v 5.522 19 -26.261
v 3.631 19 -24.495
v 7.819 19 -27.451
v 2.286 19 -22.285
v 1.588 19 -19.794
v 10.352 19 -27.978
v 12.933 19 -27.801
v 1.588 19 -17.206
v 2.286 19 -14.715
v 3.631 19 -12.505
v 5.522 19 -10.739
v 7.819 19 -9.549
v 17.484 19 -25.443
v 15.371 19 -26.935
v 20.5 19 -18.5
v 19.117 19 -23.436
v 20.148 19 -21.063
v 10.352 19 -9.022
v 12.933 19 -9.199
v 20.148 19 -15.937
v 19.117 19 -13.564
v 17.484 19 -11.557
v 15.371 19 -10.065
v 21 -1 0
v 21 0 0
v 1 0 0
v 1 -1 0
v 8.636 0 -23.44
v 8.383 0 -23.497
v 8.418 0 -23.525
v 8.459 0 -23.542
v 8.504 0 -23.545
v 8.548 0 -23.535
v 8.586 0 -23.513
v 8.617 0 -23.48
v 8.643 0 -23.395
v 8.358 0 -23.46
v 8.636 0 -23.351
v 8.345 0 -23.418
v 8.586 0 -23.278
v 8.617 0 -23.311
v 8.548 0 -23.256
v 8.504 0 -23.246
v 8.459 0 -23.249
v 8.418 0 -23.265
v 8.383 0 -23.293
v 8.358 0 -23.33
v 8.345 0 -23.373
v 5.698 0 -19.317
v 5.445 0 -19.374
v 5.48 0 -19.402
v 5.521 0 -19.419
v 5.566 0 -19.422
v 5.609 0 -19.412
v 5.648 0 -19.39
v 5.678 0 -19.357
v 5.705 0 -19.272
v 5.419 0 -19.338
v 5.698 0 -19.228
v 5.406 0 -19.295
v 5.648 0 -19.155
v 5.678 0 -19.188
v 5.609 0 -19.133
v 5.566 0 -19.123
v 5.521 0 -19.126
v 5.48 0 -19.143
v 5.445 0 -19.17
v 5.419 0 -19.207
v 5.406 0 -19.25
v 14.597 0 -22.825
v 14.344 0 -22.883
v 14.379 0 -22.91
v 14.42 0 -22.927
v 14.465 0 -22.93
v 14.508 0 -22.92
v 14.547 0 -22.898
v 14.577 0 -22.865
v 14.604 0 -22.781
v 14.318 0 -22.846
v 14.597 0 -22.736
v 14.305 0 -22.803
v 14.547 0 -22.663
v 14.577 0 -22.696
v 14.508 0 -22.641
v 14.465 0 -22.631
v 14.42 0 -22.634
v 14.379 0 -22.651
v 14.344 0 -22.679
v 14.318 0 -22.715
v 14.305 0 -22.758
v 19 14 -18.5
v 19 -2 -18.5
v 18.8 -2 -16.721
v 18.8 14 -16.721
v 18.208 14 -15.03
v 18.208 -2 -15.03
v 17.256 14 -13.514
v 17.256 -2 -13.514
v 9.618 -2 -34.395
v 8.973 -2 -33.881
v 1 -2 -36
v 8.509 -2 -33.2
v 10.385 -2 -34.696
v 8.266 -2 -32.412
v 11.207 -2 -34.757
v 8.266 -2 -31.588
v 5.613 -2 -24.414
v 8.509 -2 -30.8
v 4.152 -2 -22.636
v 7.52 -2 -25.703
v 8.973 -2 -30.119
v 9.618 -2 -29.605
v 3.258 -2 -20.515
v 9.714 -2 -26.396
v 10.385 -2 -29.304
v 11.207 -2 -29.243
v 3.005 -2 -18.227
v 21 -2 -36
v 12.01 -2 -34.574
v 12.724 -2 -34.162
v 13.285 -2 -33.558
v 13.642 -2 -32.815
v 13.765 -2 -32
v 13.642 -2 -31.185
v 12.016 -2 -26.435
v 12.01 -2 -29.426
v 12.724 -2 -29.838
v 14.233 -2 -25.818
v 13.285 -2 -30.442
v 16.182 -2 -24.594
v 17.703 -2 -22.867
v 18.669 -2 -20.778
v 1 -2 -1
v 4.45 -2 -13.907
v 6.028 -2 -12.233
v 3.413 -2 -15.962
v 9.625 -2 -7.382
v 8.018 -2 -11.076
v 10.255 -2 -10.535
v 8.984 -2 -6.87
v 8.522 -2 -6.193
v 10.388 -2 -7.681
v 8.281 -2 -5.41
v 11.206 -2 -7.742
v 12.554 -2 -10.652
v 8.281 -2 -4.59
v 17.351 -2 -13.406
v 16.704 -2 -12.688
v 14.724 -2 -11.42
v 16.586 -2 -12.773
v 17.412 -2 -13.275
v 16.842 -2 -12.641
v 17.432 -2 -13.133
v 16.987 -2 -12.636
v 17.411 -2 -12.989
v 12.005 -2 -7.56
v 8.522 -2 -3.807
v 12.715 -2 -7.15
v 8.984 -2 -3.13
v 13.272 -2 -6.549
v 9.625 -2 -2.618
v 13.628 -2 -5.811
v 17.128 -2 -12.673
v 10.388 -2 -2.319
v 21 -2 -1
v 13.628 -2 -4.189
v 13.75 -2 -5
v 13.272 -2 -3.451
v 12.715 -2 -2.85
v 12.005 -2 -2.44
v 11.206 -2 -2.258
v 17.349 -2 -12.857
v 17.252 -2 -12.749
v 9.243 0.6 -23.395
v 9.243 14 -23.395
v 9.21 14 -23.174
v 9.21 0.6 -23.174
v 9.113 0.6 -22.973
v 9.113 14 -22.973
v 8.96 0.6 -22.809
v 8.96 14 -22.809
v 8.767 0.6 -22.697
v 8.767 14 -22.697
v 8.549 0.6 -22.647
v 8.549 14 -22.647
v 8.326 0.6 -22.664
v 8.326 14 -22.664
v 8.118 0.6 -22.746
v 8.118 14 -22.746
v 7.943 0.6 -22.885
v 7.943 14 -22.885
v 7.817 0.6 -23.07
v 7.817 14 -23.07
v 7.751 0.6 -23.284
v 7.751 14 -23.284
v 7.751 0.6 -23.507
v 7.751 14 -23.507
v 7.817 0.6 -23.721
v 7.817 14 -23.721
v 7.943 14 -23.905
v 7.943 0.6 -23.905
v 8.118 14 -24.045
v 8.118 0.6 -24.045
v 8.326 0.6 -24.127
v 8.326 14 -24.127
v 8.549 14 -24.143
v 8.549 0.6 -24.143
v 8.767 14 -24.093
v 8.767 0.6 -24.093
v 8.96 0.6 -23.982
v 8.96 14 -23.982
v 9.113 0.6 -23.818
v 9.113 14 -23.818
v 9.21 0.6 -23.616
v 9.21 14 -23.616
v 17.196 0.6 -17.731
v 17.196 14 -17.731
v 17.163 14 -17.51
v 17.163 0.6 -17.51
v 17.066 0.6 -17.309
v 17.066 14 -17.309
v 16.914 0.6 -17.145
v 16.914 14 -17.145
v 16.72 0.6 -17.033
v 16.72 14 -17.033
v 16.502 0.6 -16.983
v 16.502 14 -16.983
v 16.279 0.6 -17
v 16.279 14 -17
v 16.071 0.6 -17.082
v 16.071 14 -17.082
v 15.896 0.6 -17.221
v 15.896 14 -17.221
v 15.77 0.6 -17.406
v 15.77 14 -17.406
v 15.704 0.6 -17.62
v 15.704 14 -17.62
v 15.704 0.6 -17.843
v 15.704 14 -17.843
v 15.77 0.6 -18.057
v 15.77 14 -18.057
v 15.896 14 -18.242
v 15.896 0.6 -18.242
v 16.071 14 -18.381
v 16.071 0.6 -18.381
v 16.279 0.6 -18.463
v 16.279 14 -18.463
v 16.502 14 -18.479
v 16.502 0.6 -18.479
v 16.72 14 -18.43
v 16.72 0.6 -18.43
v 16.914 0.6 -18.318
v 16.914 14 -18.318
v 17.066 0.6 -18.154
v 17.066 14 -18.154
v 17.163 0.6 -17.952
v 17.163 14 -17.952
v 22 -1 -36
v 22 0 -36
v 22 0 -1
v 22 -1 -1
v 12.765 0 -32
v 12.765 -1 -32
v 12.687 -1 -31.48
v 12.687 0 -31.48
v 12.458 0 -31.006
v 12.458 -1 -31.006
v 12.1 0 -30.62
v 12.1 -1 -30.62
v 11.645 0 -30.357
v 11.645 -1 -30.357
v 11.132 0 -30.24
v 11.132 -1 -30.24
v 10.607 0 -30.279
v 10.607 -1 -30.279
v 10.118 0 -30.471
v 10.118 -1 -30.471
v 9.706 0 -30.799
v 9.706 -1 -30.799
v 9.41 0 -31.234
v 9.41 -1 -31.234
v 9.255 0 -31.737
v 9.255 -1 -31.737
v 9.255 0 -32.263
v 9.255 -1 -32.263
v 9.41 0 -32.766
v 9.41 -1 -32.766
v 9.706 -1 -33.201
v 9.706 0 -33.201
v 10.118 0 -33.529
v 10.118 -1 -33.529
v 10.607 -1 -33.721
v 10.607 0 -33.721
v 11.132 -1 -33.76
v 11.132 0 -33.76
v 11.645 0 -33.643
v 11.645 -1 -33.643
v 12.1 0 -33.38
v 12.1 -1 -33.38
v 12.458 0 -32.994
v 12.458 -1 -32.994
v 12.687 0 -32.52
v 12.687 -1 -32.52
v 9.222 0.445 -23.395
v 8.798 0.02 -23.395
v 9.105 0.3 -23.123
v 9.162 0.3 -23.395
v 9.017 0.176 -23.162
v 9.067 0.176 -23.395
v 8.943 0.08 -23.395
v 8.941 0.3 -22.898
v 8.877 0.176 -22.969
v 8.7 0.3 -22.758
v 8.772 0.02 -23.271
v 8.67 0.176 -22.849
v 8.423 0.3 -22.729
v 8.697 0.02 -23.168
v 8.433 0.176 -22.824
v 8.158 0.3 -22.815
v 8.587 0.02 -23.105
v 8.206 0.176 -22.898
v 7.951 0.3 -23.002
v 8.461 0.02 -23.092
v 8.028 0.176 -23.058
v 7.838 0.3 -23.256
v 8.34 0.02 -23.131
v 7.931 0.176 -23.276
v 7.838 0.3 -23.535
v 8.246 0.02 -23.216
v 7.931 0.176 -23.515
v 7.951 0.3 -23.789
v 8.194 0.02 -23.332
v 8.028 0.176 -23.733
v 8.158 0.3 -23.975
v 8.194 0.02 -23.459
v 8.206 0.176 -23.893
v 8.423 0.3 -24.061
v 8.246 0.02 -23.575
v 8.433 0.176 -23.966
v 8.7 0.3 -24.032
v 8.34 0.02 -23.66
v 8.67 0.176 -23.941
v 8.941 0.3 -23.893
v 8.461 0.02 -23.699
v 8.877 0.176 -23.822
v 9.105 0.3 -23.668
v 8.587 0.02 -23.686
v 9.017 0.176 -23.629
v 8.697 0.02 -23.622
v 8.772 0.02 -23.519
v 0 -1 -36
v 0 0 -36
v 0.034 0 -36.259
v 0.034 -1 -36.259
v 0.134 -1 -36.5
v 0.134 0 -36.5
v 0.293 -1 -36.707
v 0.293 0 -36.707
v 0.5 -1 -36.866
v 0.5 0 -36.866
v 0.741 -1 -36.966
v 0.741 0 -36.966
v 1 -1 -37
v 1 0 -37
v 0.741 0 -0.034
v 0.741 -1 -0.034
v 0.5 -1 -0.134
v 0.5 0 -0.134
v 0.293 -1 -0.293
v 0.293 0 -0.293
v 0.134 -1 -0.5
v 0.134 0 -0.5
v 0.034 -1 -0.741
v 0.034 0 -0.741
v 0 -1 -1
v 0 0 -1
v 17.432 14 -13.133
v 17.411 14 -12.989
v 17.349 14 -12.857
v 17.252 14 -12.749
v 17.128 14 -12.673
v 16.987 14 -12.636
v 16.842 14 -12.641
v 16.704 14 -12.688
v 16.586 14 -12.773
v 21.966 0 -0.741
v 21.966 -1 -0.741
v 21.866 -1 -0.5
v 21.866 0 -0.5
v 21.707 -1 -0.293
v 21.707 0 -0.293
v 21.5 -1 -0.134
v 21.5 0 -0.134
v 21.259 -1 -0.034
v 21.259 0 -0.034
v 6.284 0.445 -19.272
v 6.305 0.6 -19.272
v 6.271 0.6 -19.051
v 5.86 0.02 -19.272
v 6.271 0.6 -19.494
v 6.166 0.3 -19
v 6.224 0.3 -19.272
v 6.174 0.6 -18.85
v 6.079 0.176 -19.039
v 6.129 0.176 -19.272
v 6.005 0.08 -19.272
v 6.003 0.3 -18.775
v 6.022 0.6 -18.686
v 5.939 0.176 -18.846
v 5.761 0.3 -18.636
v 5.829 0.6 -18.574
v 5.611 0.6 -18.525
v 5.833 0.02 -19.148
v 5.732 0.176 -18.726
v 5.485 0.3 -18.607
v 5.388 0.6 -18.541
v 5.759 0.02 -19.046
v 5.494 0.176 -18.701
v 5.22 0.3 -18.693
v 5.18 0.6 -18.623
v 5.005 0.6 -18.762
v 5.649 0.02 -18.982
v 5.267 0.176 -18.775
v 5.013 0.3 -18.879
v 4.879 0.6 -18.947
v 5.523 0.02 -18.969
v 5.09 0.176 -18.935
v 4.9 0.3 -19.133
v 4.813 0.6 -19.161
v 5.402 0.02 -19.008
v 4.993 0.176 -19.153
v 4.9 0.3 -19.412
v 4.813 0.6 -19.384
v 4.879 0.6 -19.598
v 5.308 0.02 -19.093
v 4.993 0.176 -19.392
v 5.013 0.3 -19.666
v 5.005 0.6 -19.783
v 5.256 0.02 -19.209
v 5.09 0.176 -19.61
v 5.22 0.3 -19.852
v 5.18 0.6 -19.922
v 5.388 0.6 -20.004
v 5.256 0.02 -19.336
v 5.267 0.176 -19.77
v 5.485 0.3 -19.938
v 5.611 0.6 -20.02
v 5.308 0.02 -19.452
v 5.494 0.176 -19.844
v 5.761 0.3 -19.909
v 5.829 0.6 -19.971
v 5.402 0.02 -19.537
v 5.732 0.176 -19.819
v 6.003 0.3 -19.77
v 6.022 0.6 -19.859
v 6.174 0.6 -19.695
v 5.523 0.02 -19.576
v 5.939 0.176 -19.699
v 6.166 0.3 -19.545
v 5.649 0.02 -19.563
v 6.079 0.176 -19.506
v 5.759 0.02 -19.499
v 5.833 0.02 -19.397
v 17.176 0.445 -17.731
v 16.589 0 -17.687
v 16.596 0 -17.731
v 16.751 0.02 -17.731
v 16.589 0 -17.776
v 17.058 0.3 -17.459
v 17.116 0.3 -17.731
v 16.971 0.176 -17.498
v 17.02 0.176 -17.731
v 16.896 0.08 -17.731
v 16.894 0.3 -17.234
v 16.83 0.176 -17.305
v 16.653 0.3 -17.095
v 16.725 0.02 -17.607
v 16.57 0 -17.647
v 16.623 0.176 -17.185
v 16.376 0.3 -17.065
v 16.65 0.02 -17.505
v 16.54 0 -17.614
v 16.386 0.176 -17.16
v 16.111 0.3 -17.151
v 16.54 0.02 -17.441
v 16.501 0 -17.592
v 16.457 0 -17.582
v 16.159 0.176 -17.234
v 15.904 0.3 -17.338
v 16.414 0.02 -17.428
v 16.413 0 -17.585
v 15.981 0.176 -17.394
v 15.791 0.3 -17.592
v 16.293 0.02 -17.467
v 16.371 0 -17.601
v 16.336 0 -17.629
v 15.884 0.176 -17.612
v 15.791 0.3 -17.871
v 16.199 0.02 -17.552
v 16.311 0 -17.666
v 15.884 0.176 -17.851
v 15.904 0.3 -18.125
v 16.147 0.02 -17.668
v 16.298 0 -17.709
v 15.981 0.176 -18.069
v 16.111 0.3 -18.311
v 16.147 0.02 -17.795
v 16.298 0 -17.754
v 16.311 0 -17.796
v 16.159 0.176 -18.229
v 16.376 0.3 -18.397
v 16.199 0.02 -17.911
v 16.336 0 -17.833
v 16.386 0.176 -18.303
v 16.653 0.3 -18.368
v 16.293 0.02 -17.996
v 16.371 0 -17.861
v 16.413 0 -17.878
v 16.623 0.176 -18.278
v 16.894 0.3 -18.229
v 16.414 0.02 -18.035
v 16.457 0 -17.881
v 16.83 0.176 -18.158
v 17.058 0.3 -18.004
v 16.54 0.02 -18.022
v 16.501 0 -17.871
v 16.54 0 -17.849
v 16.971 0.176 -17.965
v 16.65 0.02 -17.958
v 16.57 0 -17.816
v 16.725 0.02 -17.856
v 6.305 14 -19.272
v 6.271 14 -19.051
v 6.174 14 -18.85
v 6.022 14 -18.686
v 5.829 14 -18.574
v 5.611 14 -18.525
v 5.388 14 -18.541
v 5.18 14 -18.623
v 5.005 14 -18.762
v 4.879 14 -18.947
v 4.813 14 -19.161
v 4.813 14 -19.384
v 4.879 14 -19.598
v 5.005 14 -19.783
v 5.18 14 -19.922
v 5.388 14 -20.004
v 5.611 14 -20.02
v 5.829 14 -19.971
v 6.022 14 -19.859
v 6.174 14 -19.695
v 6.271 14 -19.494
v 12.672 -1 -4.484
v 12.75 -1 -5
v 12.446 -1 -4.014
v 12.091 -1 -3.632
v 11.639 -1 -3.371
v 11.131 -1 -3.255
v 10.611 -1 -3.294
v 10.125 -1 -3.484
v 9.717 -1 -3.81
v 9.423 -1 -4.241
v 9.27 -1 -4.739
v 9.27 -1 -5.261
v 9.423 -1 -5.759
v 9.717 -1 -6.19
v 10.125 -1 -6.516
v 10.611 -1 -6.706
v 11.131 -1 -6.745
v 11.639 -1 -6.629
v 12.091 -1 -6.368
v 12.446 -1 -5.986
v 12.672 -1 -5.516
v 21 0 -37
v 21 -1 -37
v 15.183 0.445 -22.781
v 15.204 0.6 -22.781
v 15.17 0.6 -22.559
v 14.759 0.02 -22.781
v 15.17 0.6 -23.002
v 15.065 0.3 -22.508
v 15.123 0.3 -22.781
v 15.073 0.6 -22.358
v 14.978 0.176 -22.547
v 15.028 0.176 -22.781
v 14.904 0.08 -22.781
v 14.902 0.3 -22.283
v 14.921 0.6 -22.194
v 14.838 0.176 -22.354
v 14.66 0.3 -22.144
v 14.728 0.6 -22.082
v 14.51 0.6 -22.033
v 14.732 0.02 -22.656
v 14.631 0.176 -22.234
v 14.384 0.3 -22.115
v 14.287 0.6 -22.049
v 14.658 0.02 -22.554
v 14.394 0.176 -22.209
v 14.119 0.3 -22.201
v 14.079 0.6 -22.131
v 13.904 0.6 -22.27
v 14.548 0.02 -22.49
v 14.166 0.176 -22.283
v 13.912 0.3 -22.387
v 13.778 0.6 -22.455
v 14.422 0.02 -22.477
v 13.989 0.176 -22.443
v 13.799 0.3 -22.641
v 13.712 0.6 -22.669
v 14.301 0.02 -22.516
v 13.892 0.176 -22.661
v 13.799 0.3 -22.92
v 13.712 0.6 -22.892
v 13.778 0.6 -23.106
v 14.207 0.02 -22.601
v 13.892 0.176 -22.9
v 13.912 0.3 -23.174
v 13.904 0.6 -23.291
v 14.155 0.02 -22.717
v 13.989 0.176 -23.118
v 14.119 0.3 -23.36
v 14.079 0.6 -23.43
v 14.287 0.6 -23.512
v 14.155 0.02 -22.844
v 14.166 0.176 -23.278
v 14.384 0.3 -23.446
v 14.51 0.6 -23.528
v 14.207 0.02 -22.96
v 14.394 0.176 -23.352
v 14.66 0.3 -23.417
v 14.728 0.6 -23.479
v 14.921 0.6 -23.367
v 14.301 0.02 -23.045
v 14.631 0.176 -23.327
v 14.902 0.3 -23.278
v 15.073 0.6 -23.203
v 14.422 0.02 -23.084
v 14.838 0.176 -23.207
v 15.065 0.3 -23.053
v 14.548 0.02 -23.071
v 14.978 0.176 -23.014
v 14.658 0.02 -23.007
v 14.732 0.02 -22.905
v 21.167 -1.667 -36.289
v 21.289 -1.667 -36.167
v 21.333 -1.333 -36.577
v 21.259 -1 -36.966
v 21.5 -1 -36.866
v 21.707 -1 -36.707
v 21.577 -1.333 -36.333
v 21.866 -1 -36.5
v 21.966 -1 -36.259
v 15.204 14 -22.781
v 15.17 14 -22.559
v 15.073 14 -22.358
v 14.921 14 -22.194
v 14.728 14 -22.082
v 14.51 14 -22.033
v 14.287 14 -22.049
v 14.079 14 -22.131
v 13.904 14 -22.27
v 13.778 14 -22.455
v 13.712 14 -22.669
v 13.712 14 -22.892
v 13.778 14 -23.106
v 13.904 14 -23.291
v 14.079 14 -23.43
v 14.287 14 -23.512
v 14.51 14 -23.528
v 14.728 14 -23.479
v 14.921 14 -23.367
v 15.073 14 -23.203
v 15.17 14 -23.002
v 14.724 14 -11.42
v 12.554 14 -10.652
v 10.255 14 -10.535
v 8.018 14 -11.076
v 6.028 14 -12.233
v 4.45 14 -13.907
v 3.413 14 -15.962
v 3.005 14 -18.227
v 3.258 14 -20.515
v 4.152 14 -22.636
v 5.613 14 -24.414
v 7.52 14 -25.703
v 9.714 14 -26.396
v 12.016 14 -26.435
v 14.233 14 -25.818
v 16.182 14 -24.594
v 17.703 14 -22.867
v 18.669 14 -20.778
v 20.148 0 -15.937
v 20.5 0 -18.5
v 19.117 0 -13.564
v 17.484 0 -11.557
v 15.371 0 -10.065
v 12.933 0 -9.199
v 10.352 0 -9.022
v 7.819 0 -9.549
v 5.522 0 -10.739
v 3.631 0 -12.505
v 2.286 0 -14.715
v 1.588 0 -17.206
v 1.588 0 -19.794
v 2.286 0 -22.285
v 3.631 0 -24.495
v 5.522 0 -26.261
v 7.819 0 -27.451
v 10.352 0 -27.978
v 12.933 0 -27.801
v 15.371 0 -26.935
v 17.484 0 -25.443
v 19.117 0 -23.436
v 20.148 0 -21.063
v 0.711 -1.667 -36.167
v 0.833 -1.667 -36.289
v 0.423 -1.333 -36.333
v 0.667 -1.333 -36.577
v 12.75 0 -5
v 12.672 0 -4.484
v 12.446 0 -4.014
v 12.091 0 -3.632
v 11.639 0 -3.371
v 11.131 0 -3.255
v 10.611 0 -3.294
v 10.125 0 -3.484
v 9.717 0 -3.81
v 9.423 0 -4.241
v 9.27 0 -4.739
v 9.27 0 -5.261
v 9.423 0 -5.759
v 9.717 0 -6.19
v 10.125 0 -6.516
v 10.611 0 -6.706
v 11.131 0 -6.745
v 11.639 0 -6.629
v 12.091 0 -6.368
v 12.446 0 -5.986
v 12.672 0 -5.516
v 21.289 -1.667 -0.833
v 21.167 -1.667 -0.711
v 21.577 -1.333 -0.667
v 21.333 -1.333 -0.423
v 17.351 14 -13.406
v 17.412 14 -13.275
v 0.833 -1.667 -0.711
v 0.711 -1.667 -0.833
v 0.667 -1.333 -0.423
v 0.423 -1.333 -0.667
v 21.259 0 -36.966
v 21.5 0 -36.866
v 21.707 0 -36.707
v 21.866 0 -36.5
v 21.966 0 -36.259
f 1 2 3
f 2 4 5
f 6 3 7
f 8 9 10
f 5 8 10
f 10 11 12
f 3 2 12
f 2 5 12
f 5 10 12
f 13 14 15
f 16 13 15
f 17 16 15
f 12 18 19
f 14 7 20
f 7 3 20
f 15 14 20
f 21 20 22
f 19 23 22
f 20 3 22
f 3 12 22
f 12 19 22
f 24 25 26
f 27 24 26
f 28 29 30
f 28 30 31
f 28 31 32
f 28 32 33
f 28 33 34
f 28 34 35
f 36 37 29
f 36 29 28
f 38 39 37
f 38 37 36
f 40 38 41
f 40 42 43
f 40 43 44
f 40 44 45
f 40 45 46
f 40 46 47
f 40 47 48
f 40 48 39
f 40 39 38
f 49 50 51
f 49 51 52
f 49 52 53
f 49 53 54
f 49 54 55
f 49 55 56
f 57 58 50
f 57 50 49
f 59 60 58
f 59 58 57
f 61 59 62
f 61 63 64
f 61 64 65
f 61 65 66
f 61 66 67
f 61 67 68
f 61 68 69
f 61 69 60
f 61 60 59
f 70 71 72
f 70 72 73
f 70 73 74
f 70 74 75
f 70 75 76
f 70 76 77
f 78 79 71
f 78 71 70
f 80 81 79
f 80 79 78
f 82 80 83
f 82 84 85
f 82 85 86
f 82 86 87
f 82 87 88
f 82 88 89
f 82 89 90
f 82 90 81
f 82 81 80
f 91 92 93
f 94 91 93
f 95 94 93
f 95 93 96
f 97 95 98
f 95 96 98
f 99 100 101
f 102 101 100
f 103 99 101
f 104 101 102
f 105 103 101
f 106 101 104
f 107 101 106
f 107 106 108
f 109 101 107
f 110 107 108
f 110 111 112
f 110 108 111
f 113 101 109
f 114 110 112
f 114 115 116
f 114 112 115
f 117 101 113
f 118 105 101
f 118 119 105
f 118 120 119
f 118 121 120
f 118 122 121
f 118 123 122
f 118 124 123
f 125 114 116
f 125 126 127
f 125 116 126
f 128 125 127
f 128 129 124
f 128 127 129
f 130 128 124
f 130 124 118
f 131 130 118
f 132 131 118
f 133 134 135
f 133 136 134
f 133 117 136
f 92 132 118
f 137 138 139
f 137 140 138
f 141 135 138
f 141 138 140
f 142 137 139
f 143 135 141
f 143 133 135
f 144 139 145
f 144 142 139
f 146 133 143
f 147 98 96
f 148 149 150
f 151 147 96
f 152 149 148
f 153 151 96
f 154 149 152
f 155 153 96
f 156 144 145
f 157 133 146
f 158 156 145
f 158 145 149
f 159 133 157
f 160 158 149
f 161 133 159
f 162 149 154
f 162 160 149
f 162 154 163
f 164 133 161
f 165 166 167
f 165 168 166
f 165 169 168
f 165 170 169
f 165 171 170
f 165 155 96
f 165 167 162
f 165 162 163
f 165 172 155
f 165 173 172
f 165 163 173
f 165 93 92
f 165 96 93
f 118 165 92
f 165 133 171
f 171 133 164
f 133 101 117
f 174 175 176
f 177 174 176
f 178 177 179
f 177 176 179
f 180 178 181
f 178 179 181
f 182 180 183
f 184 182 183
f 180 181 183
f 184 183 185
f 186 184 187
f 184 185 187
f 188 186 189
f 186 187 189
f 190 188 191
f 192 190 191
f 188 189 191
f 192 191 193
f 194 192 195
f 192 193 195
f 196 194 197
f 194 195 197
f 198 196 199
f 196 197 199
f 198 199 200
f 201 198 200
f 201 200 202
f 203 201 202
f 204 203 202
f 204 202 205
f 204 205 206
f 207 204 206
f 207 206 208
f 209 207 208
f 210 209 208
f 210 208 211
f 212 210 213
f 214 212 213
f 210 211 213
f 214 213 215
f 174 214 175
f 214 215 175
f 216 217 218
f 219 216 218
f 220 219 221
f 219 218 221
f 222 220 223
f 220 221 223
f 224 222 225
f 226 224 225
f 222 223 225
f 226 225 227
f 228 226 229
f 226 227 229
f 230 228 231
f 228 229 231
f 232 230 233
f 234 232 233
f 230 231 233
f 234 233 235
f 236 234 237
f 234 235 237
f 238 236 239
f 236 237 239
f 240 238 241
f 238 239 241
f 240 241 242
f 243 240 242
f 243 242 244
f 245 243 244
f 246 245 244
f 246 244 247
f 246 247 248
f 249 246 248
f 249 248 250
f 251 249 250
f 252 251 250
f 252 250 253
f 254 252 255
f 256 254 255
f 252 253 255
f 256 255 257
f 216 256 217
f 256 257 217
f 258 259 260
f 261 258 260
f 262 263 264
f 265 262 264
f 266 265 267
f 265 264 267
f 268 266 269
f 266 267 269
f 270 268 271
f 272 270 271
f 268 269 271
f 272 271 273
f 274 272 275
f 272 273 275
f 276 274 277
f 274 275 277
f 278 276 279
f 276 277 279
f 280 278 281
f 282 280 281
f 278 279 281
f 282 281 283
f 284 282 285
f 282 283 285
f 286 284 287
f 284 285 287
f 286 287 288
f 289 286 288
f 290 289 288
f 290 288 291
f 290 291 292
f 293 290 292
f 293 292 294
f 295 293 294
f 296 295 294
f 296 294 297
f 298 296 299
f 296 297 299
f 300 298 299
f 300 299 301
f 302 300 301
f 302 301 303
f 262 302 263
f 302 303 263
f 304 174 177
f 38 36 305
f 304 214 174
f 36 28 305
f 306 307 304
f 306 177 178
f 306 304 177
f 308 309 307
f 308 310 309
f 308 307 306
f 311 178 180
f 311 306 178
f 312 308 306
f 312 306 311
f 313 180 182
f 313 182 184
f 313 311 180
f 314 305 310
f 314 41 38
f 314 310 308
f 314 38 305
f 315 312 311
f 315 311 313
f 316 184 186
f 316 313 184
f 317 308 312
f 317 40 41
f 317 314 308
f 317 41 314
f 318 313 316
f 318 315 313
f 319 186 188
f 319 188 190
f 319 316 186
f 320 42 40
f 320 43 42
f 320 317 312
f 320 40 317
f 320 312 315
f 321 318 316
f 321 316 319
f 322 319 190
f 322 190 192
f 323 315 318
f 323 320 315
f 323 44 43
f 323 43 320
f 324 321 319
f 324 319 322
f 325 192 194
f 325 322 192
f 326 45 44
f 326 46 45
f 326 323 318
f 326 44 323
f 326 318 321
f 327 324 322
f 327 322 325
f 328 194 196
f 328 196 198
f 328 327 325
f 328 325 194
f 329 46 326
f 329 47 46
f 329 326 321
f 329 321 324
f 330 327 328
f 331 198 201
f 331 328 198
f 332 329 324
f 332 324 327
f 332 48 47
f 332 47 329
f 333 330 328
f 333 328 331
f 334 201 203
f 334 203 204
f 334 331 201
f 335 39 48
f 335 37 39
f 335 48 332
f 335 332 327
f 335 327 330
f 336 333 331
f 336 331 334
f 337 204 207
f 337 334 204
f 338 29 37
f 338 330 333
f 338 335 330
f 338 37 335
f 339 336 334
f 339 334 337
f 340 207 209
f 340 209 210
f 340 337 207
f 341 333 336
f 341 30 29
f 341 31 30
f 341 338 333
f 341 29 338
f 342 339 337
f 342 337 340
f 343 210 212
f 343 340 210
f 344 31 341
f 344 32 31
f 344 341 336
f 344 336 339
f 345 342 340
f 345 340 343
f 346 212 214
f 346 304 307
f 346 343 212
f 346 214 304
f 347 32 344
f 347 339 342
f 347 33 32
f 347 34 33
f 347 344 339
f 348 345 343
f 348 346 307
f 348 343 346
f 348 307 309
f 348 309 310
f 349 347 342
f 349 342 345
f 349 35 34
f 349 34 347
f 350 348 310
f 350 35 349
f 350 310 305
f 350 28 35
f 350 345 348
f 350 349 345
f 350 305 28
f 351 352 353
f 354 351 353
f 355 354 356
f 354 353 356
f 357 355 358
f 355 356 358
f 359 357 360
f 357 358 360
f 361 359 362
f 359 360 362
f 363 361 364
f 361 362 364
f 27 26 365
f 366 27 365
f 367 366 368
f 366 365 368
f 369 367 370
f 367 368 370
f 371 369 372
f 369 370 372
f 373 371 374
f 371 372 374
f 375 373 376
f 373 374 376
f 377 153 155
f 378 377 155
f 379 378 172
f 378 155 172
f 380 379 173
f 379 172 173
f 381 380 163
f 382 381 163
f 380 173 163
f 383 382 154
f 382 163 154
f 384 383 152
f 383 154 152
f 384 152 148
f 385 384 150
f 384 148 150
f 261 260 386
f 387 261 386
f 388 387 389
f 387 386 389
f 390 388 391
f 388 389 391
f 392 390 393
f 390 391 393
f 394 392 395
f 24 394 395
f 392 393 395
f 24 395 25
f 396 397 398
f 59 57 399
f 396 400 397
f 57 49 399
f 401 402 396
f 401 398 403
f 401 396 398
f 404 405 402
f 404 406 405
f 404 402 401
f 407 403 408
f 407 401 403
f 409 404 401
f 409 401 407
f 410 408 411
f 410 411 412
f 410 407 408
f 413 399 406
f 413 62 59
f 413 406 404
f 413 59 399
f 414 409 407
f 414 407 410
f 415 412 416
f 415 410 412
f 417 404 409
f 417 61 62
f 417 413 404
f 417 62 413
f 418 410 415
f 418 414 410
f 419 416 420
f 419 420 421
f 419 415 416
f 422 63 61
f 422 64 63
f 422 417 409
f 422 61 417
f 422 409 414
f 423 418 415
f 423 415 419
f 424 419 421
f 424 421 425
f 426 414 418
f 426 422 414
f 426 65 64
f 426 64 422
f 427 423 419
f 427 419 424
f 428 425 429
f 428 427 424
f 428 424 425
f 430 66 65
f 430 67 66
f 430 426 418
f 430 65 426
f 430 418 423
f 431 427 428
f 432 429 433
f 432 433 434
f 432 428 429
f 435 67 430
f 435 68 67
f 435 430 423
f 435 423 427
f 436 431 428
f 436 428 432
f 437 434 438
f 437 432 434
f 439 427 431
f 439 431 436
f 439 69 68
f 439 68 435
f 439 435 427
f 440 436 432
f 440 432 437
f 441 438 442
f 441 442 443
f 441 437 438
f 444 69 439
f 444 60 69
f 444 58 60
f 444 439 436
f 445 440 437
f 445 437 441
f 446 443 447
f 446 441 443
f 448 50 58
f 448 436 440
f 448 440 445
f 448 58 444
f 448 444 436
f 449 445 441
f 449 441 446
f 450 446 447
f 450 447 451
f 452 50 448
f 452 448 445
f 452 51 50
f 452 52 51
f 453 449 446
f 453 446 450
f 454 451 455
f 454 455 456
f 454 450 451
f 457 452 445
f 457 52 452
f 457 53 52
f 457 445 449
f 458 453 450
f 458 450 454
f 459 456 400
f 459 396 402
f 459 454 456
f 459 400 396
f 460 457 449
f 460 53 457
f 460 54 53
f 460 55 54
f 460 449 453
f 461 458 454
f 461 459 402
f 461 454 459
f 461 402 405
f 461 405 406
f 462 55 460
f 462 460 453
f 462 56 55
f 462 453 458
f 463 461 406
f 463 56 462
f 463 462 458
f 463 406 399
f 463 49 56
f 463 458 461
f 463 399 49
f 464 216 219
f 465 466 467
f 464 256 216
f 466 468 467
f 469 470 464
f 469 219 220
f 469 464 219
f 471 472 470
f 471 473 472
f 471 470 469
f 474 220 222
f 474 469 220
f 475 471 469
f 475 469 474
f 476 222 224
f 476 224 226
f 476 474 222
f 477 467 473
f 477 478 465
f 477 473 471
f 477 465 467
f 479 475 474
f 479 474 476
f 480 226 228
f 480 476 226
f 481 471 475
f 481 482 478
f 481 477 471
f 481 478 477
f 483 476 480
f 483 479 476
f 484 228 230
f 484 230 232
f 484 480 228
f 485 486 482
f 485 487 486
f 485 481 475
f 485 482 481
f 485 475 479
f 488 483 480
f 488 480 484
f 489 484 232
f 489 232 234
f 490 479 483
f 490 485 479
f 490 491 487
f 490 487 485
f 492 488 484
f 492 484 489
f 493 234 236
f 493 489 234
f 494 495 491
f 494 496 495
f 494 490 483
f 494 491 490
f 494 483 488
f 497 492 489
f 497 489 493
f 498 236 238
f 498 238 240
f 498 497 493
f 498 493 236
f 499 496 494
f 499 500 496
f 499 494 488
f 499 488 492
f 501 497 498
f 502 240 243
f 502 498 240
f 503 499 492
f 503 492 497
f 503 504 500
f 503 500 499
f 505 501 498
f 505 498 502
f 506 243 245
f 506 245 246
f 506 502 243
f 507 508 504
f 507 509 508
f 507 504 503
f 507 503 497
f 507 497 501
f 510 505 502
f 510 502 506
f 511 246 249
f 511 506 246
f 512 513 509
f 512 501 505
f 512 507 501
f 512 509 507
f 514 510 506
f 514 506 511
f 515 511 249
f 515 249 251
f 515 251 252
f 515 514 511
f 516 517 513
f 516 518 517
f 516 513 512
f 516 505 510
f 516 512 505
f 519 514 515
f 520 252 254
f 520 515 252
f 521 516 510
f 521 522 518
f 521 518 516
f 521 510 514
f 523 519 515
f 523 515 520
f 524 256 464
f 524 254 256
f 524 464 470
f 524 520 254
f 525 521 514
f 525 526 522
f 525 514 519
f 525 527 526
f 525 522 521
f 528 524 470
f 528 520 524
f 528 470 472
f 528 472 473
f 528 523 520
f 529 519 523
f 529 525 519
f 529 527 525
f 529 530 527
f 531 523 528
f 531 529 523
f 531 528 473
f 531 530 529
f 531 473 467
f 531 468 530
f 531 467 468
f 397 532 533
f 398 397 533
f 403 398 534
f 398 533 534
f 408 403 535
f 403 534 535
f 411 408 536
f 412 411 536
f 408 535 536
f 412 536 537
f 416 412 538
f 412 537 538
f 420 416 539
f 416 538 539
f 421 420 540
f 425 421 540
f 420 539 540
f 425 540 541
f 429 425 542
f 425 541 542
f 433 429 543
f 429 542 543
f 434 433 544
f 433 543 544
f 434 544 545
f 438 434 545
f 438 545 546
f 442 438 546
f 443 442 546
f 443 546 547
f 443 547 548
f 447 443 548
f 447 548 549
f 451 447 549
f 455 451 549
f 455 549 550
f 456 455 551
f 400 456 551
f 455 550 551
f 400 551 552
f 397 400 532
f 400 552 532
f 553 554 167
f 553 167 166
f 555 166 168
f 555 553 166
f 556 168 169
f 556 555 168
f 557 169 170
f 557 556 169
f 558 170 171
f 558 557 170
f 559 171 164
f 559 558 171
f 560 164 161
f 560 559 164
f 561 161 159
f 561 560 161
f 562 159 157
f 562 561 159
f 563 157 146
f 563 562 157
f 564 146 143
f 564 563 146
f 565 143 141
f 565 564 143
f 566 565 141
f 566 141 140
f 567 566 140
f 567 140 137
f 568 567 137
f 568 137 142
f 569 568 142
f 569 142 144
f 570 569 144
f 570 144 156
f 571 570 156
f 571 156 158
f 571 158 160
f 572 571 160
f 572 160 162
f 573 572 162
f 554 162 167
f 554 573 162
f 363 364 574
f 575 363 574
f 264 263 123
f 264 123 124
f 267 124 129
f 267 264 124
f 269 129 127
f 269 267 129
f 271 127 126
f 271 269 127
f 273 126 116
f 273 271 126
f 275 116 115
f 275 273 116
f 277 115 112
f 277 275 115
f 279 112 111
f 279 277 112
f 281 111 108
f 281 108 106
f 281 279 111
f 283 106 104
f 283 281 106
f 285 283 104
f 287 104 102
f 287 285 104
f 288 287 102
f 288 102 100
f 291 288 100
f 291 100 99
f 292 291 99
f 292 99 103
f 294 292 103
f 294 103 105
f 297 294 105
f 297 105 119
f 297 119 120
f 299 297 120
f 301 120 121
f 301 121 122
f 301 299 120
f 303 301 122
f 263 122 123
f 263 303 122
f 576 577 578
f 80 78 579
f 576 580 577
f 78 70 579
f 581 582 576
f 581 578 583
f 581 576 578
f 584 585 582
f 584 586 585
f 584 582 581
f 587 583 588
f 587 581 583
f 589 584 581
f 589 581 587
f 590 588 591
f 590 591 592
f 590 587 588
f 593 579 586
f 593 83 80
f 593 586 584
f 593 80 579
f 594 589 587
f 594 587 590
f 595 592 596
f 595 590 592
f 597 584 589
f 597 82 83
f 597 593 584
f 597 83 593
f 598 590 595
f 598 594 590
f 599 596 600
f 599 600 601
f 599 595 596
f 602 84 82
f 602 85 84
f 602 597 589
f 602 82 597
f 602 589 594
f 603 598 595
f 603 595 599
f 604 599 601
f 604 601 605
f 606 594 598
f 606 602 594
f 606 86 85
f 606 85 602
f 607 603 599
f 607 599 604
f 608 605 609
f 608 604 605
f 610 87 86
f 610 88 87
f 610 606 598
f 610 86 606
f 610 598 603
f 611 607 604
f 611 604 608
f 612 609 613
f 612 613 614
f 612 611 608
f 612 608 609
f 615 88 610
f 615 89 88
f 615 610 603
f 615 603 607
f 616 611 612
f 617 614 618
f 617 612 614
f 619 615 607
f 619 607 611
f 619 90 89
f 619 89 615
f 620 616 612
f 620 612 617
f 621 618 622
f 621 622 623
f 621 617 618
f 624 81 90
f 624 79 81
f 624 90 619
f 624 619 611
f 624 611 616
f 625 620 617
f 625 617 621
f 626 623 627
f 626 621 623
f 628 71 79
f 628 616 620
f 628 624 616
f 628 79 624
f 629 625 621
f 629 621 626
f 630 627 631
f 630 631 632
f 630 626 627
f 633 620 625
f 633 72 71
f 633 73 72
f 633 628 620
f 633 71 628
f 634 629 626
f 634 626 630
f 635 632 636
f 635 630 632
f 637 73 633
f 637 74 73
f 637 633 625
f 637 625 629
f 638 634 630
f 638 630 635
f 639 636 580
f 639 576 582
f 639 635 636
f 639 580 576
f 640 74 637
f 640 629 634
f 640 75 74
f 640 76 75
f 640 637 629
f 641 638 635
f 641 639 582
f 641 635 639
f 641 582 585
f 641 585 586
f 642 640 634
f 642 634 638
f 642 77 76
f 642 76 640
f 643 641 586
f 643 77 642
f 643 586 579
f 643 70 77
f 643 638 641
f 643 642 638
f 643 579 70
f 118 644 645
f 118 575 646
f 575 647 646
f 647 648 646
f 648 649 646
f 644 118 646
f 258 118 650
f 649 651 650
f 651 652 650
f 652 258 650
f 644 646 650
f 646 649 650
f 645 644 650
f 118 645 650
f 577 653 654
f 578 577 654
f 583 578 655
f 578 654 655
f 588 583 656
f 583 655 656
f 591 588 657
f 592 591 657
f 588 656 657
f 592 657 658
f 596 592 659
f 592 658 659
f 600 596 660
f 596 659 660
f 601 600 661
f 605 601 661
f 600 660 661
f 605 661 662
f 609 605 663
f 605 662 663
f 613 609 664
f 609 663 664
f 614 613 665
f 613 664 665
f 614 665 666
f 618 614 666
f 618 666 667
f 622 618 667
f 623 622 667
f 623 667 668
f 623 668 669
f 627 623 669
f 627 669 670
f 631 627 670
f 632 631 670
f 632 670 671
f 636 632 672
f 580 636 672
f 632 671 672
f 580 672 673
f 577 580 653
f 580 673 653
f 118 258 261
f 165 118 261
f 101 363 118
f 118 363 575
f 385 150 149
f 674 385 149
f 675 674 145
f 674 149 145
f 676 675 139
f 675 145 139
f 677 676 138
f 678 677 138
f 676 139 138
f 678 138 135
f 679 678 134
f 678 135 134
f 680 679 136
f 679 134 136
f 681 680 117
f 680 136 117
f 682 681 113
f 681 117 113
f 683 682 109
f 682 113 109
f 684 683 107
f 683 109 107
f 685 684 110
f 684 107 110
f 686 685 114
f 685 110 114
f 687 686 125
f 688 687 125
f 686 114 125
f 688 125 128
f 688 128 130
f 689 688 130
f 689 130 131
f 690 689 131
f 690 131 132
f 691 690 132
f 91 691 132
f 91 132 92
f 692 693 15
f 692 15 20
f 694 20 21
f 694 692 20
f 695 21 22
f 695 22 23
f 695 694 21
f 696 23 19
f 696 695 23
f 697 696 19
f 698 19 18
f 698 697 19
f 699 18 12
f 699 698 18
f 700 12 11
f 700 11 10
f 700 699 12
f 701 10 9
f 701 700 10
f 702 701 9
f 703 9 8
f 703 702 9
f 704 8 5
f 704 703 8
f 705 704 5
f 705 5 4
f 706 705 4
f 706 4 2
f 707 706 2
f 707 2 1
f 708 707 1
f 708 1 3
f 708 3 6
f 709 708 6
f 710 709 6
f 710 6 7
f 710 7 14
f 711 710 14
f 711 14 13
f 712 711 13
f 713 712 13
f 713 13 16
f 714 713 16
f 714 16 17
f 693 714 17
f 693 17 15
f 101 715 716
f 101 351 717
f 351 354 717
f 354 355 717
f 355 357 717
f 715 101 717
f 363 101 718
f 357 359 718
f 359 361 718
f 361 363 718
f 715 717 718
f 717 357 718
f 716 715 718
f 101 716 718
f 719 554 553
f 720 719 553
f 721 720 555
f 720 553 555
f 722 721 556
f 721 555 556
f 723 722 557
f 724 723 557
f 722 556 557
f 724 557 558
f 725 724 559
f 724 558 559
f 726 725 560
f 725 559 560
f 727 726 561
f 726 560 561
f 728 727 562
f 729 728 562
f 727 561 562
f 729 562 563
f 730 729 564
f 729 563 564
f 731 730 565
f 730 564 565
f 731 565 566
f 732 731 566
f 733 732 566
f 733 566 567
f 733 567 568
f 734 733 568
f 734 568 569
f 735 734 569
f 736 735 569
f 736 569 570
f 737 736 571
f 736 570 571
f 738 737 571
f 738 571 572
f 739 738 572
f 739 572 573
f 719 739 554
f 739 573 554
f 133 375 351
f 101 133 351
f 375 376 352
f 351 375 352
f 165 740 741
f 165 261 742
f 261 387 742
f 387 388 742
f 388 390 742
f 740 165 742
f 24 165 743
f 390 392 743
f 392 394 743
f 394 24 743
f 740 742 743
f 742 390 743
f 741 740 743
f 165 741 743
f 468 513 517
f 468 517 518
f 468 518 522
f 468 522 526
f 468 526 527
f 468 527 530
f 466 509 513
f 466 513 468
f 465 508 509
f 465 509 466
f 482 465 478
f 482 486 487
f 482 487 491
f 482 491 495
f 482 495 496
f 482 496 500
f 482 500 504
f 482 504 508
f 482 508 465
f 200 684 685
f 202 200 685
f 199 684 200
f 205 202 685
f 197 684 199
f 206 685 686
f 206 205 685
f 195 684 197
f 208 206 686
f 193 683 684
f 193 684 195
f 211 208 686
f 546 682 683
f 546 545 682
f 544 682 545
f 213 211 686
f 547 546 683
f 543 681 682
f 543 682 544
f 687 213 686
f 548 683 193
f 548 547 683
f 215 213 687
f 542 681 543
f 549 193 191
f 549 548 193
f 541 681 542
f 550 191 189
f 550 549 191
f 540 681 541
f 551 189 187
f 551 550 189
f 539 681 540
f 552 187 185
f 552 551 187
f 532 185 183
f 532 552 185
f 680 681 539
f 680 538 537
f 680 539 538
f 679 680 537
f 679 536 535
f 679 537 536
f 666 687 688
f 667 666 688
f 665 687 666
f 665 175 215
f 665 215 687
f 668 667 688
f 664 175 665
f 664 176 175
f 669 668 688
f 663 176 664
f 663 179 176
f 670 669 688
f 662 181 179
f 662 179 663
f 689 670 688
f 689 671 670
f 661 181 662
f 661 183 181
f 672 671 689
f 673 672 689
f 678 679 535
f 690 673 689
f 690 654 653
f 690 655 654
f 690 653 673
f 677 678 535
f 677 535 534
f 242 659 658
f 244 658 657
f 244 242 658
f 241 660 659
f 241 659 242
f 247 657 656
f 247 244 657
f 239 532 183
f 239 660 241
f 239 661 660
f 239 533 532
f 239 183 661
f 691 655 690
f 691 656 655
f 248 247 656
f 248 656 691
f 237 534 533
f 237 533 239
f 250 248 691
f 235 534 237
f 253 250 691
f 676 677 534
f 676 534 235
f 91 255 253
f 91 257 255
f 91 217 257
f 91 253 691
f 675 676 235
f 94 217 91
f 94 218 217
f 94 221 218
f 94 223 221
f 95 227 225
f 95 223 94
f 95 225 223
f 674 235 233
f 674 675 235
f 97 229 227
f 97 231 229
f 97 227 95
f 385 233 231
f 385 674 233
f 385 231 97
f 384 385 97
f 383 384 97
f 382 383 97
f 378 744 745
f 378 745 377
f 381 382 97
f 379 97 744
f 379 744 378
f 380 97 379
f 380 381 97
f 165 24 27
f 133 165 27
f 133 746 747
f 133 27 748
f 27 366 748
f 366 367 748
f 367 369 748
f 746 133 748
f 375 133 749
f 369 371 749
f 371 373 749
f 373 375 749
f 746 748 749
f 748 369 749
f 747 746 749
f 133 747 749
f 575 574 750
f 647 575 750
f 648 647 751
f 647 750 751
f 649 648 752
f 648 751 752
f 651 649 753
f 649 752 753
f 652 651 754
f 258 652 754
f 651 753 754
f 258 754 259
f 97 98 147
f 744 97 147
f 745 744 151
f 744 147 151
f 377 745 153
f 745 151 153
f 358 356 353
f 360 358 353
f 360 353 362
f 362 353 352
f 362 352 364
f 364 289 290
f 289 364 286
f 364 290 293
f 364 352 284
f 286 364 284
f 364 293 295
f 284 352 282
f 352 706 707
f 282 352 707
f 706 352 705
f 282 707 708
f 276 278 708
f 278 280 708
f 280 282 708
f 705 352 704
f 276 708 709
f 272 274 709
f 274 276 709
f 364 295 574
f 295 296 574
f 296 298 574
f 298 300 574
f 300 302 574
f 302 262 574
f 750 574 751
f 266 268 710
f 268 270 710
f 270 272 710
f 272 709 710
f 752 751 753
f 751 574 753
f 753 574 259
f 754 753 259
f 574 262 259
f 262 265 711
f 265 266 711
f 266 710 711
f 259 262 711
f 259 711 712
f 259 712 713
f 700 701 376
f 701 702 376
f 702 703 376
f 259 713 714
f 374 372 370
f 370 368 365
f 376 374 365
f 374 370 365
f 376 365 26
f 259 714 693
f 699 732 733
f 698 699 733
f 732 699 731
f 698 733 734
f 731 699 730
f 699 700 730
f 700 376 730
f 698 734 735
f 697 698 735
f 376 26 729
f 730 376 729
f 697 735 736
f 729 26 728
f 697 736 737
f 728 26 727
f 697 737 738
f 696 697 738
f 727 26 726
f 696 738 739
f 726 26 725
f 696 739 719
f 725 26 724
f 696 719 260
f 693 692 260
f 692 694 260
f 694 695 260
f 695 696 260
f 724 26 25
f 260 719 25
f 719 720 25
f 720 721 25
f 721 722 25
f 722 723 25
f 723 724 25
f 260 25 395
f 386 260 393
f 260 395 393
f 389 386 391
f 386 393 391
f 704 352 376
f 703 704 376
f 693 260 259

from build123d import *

# Parameters (mm, degrees)
F1_DEPTH  = 2
F2_R      = 9.5
F3_DEPTH  = 21
F5_DEPTH  = 16
F6_R      = 0.75
F7_DEPTH  = 14
F8_R      = 0.6
F9_R      = 1.765
F9_R_2    = 1.75
F10_DEPTH = 2
F11_SIZE  = 0.99999


# Not quite as in the source:
# - a fillet or chamfer is up to 0.001 mm smaller than in the source, because OpenCascade refuses the exact size


with BuildPart() as f1:
    # F0 (on Front) → F1 (new body)
    with BuildSketch(Plane.XZ):
        with BuildLine():
            Line((21, 0), (1, 0))
            ThreePointArc((1, 0), (0.2928932188, -0.2928932188), (0, -1))
            Line((0, -1), (0, -36))
            ThreePointArc((0, -36), (0.2928932188, -36.7071067812), (1, -37))
            Line((1, -37), (21, -37))
            ThreePointArc((21, -37), (21.7071067812, -36.7071067812), (22, -36))
            Line((22, -36), (22, -1))
            ThreePointArc((22, -1), (21.7071067812, -0.2928932188), (21, 0))
        make_face()
    extrude(amount=F1_DEPTH)

    # F2 (on face) → F3 (join)
    with BuildSketch(Plane.XZ.offset(2)):
        with Locations((11, -18.5)):
            Circle(F2_R)
    extrude(amount=-F3_DEPTH)

    # F4 (on face) → F5 (cut)
    with BuildSketch(Plane.XZ.offset(2)):
        with BuildLine():
            ThreePointArc((16.5855182065, -12.7726981601), (3.6282924077, -21.6077205753), (19, -18.5))
            ThreePointArc((19, -18.5), (18.5514473986, -15.8588558944), (17.2560894533, -13.5138848036))
            ThreePointArc((17.2560894533, -13.5138848036), (16.561616122, -13.4682581434), (16.5855182065, -12.7726981601))
        make_face()
        with BuildLine():
            ThreePointArc((16.5855182065, -12.7726981601), (16.561616122, -13.4682581434), (17.2560894533, -13.5138848036))
            ThreePointArc((17.2560894533, -13.5138848036), (16.9323905302, -13.1328086863), (16.5855182065, -12.7726981601))
        make_face()
        with BuildLine():
            ThreePointArc((16.5855182065, -12.7726981601), (16.9323905302, -13.1328086863), (17.2560894533, -13.5138848036))
            ThreePointArc((17.2560894533, -13.5138848036), (17.3861798324, -13.3427497952), (17.4323905302, -13.1328086863))
            ThreePointArc((17.4323905302, -13.1328086863), (17.128048188, -12.6726803554), (16.5855182065, -12.7726981601))
        make_face()
    extrude(amount=-F5_DEPTH, mode=Mode.SUBTRACT)

    # F6 (on face) → F7 (join)
    with BuildSketch(Plane.XZ.offset(-14)):
        with Locations((14.4535416495, -22.7805431986)):
            Circle(F6_R)
        with Locations((8.4928393267, -23.3953187188)):
            Circle(F6_R)
        with Locations((5.5545138952, -19.272451346)):
            Circle(F6_R)
        with Locations((16.4460298856, -17.7313918519)):
            Circle(F6_R)
    extrude(amount=F7_DEPTH)

    # F8
    f8_edges = [f1.edges().sort_by_distance(p)[0] for p in [
        (15.69603, 0, -17.731392),
        (13.703542, 0, -22.780543),
        (7.742839, 0, -23.395319),
        (4.804514, 0, -19.272451),
    ]]
    fillet(f8_edges, radius=F8_R)

    # F9 (on face) → F10 (cut, through all)
    with BuildSketch(Plane.XZ.offset(2)):
        with Locations((11, -32)):
            Circle(F9_R)
        with Locations((11, -5)):
            Circle(F9_R_2)
    extrude(amount=-F10_DEPTH, mode=Mode.SUBTRACT)

    # F11 (size 1 in the source; OpenCascade refuses exactly that, so slightly less here)
    f11_edges = [f1.edges().sort_by_distance(p)[0] for p in [
        (9.25, -2, -5),
        (9.235, -2, -32),
        (22, -2, -18.5),
        (11, -2, -37),
        (0, -2, -18.5),
        (11, -2, 0),
        (21.707107, -2, -0.292893),
        (0.292893, -2, -0.292893),
        (21.707107, -2, -36.707107),
        (0.292893, -2, -36.707107),
    ]]
    chamfer(f11_edges, length=F11_SIZE)


solid = f1.part
